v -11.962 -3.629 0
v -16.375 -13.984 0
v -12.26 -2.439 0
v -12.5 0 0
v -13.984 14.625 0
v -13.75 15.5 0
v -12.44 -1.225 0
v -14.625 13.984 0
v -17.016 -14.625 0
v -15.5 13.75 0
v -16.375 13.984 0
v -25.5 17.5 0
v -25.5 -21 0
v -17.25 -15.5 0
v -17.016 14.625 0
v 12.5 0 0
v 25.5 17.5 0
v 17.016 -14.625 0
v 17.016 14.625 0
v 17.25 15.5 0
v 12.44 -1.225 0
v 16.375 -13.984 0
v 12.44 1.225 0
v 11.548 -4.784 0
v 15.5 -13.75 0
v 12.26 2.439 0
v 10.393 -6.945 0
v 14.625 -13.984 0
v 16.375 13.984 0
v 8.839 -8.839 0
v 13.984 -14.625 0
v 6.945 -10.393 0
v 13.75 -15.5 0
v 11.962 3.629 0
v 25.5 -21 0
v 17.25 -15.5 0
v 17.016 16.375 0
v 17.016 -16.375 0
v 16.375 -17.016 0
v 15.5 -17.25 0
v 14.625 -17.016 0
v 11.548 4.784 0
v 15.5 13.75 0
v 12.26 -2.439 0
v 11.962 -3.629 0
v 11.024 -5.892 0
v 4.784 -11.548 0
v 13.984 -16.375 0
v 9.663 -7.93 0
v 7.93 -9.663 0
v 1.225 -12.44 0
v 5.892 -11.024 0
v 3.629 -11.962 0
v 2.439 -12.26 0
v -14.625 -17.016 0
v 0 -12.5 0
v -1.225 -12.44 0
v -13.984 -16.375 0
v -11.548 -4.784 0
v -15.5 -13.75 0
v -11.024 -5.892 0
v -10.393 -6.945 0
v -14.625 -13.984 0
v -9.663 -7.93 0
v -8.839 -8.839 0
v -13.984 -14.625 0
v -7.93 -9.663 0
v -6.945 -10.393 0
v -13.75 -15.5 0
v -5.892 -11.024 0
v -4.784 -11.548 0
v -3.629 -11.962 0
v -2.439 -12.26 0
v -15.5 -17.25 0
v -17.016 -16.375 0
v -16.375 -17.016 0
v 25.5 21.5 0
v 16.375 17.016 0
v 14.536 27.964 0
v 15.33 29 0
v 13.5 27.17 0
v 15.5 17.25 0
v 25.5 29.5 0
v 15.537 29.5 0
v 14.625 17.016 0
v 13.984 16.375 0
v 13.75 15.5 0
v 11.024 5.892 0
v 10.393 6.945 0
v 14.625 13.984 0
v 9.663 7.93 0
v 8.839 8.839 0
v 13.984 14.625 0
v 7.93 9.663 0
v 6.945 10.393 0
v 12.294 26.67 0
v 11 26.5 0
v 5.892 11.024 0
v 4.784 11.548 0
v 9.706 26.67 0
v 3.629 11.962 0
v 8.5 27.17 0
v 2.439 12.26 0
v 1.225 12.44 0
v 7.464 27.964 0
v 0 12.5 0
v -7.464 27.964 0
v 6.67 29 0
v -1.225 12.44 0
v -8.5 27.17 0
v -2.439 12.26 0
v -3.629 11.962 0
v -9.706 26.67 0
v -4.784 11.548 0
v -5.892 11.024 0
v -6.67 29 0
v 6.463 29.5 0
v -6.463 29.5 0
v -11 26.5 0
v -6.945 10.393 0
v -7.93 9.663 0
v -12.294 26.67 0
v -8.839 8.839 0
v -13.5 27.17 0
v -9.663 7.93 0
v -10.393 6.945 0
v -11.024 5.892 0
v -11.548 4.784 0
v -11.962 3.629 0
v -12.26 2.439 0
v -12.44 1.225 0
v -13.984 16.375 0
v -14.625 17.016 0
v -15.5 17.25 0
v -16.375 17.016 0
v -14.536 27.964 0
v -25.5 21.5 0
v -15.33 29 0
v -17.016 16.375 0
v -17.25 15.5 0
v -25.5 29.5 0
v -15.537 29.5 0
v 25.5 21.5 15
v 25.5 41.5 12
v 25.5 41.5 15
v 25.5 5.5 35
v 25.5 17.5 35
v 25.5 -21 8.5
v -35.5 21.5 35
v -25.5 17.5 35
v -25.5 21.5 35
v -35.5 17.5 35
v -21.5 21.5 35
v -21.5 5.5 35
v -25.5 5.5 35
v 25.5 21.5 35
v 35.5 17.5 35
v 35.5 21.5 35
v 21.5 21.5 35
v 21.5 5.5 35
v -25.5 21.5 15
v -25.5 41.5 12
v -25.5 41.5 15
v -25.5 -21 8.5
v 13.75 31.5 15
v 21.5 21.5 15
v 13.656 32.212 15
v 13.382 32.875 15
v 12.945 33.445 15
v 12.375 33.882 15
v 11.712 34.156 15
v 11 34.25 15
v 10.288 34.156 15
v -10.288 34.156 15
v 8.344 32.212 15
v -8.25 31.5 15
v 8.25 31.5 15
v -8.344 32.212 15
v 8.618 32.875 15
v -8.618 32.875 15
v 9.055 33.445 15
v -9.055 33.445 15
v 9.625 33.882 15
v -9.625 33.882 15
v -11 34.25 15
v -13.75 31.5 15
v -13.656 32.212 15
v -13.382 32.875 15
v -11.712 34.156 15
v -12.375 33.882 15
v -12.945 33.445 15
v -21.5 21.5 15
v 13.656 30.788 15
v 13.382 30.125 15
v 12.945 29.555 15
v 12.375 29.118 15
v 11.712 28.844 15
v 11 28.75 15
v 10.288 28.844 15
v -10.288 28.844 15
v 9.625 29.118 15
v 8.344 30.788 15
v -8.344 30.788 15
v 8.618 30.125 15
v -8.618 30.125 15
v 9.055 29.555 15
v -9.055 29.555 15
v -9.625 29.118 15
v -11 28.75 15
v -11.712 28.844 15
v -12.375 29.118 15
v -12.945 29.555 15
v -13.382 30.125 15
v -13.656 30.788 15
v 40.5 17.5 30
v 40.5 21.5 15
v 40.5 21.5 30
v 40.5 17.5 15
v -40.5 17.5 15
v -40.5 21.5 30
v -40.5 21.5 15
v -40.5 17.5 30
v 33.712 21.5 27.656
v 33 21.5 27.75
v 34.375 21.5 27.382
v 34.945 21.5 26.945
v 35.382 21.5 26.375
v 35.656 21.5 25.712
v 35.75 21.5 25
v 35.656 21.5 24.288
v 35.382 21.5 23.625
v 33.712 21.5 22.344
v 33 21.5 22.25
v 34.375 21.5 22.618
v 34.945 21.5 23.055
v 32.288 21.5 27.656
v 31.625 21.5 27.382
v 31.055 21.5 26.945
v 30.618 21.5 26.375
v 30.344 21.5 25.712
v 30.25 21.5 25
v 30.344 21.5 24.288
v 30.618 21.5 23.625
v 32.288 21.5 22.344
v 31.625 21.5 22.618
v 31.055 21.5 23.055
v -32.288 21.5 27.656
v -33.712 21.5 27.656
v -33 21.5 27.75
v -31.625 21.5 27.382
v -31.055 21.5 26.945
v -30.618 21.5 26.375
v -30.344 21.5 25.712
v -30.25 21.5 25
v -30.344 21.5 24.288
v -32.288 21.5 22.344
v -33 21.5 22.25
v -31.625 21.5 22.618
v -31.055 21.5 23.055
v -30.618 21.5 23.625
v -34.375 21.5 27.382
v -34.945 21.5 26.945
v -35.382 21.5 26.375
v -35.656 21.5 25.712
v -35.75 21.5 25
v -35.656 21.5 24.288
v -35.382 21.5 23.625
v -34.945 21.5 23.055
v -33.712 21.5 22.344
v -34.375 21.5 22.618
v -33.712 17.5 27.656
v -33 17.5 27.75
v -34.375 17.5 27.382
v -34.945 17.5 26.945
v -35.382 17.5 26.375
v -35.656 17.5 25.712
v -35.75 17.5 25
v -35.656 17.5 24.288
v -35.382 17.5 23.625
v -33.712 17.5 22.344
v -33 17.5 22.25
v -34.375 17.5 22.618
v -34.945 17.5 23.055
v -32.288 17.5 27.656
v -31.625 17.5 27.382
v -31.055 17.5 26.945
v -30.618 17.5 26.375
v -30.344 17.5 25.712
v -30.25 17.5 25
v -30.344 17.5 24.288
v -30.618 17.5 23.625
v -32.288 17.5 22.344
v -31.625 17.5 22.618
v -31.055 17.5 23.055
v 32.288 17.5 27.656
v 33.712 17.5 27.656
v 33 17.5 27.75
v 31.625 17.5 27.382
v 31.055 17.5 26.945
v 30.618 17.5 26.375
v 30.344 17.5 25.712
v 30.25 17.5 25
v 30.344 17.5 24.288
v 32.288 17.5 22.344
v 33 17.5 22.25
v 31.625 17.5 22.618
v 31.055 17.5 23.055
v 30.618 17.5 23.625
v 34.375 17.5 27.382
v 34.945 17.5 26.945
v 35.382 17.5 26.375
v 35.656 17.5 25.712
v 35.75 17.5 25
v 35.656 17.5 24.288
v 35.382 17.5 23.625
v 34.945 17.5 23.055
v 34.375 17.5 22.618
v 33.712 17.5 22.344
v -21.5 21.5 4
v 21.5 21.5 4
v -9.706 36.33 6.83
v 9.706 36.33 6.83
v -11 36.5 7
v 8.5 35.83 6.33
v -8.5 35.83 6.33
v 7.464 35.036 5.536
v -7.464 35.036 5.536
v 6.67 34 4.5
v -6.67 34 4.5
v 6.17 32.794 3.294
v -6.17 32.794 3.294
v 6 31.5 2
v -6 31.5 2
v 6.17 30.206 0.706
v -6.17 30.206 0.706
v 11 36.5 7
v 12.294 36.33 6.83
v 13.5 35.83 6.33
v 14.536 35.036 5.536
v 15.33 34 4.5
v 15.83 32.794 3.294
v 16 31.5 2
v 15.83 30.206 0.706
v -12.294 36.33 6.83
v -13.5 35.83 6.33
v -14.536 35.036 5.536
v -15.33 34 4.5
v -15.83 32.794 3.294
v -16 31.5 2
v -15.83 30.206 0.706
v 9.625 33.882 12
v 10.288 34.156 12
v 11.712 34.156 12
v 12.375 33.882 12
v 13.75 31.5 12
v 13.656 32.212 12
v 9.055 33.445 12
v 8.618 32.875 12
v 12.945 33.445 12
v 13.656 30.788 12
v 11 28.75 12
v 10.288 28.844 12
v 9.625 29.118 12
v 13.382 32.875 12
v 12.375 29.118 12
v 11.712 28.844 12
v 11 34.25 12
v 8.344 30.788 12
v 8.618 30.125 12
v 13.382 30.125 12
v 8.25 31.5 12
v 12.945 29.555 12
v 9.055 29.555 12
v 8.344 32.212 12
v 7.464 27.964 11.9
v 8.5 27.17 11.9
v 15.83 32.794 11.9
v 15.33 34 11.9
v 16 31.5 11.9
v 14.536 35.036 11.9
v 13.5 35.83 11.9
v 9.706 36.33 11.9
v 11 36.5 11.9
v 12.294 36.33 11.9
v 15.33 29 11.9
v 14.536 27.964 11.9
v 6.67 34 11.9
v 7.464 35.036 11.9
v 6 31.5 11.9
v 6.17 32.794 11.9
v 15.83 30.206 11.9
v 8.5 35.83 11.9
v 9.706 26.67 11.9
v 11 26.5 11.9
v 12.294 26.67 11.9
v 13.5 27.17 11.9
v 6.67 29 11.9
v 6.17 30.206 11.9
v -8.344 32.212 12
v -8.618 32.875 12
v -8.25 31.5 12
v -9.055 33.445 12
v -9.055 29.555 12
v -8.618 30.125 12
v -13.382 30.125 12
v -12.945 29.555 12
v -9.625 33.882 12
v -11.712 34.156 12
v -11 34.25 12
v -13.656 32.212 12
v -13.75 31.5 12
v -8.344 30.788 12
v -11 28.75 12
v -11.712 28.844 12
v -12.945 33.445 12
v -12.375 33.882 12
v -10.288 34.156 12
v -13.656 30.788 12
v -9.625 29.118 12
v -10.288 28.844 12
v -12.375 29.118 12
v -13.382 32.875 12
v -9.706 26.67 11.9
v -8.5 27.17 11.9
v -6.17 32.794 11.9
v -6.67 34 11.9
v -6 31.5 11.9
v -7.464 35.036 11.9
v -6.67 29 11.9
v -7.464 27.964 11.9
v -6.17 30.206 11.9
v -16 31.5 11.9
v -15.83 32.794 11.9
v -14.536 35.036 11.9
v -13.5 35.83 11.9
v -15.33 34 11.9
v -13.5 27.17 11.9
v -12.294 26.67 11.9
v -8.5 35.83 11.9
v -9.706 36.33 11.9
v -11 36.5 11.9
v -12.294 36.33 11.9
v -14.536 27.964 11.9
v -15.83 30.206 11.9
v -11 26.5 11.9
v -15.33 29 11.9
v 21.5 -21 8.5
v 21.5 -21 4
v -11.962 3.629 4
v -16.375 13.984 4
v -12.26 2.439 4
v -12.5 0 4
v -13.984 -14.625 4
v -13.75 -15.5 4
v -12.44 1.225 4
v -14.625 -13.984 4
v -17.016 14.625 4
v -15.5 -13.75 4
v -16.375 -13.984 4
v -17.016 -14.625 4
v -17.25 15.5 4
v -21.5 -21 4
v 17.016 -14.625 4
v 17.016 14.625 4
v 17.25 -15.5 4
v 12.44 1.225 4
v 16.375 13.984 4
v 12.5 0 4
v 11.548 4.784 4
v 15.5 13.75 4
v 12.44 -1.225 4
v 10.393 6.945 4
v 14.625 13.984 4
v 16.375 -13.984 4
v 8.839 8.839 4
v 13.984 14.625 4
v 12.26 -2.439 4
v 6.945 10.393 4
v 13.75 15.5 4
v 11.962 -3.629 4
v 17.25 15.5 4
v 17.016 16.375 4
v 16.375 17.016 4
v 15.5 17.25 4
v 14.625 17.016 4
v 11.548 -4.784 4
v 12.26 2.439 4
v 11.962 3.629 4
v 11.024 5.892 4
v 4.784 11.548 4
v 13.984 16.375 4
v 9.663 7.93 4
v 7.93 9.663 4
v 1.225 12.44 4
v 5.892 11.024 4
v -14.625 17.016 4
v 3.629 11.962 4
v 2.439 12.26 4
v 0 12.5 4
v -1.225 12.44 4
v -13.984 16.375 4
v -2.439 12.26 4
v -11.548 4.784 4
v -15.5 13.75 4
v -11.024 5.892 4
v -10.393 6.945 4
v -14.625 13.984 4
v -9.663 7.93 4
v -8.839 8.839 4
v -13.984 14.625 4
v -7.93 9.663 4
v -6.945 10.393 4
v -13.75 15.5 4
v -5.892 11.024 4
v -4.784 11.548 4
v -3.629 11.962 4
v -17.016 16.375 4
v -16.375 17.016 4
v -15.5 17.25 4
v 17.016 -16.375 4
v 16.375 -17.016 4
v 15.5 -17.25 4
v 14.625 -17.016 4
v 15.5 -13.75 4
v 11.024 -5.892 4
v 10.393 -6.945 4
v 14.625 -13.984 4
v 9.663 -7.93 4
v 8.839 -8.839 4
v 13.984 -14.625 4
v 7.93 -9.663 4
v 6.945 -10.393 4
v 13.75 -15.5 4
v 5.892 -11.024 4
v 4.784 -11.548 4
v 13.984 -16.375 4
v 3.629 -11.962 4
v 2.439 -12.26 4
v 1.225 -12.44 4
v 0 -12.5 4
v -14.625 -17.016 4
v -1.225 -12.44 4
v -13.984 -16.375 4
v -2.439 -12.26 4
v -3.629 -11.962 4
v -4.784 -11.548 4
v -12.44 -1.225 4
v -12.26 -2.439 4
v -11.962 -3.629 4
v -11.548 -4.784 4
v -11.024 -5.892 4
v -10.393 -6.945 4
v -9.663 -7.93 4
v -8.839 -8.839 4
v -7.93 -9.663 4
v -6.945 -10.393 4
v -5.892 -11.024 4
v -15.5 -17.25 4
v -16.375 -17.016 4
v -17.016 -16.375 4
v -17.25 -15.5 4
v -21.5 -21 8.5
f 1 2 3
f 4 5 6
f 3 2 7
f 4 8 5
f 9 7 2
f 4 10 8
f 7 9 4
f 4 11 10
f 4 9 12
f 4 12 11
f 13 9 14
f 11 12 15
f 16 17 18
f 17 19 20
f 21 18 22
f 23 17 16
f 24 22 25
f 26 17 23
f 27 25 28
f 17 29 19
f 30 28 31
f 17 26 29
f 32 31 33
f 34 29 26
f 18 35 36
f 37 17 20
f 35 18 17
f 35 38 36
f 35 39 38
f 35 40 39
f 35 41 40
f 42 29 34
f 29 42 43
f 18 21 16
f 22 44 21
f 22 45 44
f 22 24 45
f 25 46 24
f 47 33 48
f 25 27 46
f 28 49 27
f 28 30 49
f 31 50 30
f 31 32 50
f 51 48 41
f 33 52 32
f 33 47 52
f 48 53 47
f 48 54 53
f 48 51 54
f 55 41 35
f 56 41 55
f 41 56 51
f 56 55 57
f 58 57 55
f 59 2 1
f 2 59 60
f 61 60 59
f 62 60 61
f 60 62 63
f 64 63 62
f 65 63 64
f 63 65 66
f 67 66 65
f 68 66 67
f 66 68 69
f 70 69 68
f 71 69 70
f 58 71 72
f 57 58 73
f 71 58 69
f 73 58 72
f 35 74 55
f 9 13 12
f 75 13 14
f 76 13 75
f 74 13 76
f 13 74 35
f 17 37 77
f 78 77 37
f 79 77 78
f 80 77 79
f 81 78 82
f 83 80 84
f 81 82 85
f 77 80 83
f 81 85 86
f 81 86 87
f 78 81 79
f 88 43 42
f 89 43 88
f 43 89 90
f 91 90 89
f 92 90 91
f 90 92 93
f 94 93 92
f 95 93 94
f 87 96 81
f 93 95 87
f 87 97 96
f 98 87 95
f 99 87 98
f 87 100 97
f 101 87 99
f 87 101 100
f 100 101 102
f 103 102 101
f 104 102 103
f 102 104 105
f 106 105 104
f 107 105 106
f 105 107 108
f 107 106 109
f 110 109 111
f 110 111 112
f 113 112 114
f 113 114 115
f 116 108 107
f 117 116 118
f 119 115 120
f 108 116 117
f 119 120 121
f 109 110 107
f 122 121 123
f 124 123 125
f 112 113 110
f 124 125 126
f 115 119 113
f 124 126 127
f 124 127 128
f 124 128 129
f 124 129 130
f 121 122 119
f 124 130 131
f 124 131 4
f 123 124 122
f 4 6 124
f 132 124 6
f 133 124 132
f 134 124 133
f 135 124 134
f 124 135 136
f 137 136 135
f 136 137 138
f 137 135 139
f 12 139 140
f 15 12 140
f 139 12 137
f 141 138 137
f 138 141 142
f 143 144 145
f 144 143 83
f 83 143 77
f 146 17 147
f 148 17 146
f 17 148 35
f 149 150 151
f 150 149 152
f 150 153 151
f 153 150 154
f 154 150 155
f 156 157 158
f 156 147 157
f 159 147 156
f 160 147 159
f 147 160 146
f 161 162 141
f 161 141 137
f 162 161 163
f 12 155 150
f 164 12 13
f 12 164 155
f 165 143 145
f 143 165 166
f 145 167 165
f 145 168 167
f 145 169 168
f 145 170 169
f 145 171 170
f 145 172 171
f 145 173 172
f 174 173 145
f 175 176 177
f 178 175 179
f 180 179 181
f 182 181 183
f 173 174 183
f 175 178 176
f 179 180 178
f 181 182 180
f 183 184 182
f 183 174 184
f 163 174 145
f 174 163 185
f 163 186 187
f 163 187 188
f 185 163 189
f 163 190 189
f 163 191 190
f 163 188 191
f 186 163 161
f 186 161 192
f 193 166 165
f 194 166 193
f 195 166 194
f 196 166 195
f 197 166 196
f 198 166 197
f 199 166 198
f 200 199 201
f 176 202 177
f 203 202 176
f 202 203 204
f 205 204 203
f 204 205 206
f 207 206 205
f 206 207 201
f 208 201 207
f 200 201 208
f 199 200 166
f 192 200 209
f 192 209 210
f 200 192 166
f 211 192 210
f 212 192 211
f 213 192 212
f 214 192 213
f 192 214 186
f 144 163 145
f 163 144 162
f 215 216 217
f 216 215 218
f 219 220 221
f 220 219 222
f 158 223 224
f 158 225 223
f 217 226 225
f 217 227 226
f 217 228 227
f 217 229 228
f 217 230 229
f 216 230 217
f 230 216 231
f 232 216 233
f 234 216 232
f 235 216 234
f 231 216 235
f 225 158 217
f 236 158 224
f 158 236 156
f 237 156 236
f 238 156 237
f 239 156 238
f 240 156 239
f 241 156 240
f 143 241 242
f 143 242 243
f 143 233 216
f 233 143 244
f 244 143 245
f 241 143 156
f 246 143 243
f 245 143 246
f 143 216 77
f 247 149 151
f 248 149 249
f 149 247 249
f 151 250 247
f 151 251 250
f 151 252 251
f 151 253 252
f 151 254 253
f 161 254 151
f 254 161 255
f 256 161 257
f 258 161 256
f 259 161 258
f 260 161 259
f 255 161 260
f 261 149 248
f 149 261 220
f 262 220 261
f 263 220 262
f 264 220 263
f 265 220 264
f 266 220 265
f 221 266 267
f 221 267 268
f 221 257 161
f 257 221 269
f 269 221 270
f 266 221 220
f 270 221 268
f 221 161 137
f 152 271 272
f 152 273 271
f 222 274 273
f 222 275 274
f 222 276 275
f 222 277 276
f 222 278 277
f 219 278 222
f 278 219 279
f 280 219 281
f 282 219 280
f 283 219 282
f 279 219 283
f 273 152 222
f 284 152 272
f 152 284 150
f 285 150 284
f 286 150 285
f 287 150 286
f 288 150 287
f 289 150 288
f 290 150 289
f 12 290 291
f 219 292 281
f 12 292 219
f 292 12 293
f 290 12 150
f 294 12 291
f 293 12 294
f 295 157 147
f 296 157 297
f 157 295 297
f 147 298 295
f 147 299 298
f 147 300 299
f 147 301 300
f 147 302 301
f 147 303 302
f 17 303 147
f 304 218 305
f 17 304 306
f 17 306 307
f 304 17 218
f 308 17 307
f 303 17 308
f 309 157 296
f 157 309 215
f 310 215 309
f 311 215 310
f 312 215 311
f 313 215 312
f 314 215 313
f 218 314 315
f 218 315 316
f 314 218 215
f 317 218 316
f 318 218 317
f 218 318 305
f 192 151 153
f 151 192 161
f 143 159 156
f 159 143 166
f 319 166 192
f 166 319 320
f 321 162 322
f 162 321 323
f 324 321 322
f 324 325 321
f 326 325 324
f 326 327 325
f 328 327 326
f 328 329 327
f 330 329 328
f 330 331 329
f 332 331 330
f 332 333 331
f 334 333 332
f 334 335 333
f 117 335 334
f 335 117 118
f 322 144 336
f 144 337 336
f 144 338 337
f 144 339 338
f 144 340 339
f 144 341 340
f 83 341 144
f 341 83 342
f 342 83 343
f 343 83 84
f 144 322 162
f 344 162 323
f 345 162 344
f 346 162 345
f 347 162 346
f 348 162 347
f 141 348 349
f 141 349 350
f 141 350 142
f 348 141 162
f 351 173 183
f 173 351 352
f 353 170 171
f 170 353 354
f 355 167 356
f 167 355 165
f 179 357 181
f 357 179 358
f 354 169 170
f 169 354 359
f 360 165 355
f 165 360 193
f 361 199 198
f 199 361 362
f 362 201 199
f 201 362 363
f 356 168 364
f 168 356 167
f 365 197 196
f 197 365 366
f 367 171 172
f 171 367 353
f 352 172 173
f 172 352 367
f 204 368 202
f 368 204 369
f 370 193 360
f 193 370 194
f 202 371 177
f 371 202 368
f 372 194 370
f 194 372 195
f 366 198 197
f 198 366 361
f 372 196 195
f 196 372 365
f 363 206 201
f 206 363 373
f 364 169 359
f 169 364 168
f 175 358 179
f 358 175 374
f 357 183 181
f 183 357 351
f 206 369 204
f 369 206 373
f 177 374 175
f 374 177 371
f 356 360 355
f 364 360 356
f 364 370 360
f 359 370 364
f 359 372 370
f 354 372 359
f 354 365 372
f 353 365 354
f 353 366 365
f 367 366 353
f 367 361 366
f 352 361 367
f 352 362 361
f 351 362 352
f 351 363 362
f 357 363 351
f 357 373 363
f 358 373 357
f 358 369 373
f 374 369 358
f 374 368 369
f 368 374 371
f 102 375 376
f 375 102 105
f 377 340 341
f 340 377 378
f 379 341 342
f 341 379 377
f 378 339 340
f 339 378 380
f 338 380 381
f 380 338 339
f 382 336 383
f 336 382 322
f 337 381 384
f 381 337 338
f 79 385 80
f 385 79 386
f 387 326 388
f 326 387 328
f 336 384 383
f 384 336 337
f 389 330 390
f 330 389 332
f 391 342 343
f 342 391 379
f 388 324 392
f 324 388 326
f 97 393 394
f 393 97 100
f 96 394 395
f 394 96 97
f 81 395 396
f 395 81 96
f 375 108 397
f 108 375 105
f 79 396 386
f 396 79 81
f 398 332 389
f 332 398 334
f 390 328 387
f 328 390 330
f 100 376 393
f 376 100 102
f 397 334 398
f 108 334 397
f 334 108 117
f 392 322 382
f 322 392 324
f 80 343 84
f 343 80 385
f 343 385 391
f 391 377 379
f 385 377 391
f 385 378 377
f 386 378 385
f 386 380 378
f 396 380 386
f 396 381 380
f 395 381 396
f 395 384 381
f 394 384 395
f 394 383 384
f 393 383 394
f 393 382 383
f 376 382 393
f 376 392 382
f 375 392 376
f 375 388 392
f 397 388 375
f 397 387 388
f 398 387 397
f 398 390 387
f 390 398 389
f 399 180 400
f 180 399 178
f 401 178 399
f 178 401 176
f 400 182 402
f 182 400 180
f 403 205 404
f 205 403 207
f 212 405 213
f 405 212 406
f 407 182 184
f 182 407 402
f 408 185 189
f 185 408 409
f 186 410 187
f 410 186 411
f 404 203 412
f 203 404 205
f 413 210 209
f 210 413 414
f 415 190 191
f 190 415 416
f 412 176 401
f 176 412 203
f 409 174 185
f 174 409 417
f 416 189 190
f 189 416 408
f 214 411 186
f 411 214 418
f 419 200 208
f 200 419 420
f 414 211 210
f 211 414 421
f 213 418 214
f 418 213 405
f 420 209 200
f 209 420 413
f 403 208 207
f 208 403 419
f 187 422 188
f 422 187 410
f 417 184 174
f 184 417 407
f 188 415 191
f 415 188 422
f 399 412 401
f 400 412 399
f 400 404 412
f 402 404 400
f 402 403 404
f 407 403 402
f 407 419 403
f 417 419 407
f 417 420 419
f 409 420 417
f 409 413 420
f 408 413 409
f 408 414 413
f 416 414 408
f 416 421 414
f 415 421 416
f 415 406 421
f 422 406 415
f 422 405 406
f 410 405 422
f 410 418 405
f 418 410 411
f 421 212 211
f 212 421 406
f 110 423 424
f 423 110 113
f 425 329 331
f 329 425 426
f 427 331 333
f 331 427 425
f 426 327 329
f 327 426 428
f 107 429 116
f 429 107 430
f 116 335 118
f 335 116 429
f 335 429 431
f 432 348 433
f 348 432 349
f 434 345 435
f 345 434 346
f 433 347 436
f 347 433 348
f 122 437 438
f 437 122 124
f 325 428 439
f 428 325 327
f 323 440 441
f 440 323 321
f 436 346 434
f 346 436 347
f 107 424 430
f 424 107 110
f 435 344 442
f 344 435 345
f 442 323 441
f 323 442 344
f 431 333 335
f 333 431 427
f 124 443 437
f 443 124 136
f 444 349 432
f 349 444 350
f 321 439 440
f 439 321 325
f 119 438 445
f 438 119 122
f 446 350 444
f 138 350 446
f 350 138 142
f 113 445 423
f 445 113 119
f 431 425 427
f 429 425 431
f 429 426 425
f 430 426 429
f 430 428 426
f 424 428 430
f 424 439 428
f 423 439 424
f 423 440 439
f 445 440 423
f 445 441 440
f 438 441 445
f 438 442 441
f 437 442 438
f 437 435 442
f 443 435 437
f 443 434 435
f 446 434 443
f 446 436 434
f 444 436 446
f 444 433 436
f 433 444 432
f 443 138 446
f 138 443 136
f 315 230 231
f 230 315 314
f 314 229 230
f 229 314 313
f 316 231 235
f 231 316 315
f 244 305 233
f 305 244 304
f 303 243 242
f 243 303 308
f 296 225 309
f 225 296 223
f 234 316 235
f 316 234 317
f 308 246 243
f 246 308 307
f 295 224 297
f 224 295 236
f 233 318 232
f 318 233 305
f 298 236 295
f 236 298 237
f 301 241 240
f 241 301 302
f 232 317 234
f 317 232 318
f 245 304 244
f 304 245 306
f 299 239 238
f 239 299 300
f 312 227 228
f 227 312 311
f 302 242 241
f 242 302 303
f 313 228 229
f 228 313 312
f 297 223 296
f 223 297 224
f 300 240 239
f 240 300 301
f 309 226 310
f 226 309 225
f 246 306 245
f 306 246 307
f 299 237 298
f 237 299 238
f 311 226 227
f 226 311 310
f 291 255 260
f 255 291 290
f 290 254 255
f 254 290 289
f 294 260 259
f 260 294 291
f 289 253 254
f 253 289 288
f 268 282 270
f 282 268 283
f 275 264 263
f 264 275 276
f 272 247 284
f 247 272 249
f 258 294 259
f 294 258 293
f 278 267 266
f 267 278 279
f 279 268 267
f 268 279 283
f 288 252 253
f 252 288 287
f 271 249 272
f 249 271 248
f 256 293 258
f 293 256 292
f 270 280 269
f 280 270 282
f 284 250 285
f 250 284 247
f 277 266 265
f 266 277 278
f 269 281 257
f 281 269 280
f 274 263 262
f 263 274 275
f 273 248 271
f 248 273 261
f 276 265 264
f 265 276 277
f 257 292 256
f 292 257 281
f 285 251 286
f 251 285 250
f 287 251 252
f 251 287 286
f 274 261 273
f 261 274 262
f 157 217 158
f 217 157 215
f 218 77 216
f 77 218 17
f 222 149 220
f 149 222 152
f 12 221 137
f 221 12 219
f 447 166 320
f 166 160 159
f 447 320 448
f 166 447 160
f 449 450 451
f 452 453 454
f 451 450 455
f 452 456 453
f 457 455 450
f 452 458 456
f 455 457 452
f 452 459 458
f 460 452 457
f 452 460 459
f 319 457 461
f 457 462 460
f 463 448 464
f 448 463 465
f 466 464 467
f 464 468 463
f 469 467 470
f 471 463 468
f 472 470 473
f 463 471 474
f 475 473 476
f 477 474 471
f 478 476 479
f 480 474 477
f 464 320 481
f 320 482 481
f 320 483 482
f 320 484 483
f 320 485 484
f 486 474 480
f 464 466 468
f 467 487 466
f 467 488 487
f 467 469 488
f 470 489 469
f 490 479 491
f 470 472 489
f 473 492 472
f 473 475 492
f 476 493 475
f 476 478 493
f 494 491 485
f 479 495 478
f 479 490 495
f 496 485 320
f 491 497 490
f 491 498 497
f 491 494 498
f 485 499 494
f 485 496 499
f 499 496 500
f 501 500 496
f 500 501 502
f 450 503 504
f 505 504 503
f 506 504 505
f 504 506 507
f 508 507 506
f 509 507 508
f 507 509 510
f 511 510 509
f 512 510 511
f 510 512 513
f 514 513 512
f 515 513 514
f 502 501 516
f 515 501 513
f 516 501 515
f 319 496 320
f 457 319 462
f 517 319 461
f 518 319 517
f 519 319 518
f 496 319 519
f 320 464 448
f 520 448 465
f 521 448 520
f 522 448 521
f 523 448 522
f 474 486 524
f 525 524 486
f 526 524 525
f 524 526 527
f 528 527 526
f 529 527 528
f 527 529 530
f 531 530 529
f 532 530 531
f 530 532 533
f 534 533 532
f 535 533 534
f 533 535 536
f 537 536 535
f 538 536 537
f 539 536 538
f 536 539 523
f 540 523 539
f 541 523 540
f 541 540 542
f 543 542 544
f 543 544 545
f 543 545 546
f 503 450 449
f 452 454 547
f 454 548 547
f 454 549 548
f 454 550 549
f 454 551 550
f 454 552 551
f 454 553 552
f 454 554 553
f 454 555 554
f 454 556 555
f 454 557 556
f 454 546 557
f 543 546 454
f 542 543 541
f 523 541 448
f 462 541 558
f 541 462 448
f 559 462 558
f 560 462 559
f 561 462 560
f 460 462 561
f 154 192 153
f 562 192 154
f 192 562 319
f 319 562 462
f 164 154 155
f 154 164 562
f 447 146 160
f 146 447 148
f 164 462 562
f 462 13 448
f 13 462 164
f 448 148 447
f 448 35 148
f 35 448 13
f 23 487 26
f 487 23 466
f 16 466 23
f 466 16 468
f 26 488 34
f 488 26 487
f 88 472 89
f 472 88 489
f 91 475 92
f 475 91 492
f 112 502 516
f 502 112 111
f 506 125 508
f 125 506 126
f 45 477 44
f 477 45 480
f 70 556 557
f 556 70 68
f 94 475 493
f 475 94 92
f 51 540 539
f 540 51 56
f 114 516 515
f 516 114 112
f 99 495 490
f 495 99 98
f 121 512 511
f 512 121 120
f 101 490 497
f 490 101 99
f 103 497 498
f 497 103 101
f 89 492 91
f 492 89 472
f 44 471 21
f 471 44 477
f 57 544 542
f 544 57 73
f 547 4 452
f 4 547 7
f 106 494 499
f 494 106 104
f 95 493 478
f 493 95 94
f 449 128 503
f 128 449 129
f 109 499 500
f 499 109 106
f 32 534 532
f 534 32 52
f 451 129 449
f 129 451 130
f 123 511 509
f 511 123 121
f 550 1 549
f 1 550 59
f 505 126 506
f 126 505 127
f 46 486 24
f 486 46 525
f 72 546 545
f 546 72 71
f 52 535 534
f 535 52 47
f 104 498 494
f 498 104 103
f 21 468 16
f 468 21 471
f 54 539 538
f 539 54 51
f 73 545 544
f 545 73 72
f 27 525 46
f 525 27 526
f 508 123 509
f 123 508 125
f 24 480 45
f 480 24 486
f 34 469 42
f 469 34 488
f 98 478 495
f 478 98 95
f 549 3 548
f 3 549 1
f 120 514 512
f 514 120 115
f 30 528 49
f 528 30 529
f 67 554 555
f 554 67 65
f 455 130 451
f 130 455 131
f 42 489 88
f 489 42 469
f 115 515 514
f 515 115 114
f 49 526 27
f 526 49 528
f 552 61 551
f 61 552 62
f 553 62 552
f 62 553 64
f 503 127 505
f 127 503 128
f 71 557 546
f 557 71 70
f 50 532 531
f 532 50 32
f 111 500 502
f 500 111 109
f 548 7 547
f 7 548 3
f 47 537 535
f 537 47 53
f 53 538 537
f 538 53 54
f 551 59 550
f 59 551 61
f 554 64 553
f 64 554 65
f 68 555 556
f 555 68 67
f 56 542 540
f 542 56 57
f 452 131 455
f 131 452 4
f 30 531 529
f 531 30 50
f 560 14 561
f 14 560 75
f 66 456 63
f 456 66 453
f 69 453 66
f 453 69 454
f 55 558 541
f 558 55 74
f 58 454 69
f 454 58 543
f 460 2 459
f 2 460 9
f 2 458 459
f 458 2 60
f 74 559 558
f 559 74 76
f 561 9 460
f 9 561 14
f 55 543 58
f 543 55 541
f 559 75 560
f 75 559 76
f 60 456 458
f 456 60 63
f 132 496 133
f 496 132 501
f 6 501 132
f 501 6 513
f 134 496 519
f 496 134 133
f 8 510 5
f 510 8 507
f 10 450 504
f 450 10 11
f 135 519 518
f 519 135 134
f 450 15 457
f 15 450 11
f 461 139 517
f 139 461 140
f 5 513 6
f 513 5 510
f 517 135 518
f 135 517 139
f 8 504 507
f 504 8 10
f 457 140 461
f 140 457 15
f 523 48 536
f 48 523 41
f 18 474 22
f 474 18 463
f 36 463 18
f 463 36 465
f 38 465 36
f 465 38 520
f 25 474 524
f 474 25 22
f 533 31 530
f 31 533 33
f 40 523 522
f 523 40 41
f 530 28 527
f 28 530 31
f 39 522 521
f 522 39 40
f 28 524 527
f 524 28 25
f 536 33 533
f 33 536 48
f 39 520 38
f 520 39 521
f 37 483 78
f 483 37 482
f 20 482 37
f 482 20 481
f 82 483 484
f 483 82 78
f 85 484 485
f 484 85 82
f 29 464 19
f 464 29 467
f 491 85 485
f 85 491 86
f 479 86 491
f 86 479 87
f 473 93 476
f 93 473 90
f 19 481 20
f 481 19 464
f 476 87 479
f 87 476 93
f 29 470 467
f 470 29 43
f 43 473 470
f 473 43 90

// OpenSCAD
t=4;

difference()
{
    union()
    {
        translate([-21.5,-21.5,0])
            cube([43,43,t]);
        
        translate([-21.5-t,-21.5-t,0])
            cube([43+t*2,43+t*2,t+31]);
        
        translate([-21.5-t,+21.5,0])
            cube([43+t*2,20,t+31-20]);
        
        translate([-21.5-t-15,21.5-t,0])
            cube([43+t*2+15*2,t,35]);
    }
    union()
    {
        translate([-21.5-t,+21.5,t+31-20])
            cube([43+t*2,20,30]);
        
        translate([-21.5-t,+21.5+t+20-16,0])
            rotate([45+270,0,0])
                cube([43+t*2,30,30]);
        
        translate([11,21.5+10,15-3])
            cylinder(d=5.5,h=0+30,$fn=24);
        translate([11,21.5+10,0])
            cylinder(d=10,h=15-3-0.1,$fn=24);
        
        translate([-11,21.5+10,15-3])
            cylinder(d=5.5,h=0+30,$fn=24);
        translate([-11,21.5+10,0])
            cylinder(d=10,h=15-3-0.1,$fn=24);
        
        translate([21.5+t+15/2,21.5-t,31+t-10])
            rotate([270,0,0])
                cylinder(d=5.5,h=t,$fn=24);
        translate([-21.5-t-15/2,21.5-t,31+t-10])
            rotate([270,0,0])
                cylinder(d=5.5,h=t,$fn=24);
        
        translate([21.5+t+10,21.5-t,31+t])
            rotate([0,45,0])
                cube([30,t,30]);
        translate([21.5+t,21.5-t,0])
            rotate([0,45,0])
                cube([30,t,30]);
        
        translate([-21.5-t-10,21.5-t,31+t])
            rotate([0,45+180,0])
                cube([30,t,30]);
        translate([-21.5-t,21.5-t,0])
            rotate([0,45+180,0])
                cube([30,t,30]);
        
        translate([-21.5,-21.5,t])
            cube([43,43,31]);
        
        translate([-21.5-t,-21.5,t+4])
            rotate([45,0,0])
                cube([60,43,43]);
        translate([-21.5-t,-21.5-t,0])
            cube([60,.5+t,40]);
        
        cylinder(d=25,h=t,$fn=64);
        
        translate([-31/2,-31/2,0])
            cylinder(d=3.5,h=t,$fn=12);
        translate([-31/2,31/2,0])
            cylinder(d=3.5,h=t,$fn=12);
        translate([31/2,-31/2,0])
            cylinder(d=3.5,h=t,$fn=12);
        translate([31/2,31/2,0])
            cylinder(d=3.5,h=t,$fn=12);
    }
}
